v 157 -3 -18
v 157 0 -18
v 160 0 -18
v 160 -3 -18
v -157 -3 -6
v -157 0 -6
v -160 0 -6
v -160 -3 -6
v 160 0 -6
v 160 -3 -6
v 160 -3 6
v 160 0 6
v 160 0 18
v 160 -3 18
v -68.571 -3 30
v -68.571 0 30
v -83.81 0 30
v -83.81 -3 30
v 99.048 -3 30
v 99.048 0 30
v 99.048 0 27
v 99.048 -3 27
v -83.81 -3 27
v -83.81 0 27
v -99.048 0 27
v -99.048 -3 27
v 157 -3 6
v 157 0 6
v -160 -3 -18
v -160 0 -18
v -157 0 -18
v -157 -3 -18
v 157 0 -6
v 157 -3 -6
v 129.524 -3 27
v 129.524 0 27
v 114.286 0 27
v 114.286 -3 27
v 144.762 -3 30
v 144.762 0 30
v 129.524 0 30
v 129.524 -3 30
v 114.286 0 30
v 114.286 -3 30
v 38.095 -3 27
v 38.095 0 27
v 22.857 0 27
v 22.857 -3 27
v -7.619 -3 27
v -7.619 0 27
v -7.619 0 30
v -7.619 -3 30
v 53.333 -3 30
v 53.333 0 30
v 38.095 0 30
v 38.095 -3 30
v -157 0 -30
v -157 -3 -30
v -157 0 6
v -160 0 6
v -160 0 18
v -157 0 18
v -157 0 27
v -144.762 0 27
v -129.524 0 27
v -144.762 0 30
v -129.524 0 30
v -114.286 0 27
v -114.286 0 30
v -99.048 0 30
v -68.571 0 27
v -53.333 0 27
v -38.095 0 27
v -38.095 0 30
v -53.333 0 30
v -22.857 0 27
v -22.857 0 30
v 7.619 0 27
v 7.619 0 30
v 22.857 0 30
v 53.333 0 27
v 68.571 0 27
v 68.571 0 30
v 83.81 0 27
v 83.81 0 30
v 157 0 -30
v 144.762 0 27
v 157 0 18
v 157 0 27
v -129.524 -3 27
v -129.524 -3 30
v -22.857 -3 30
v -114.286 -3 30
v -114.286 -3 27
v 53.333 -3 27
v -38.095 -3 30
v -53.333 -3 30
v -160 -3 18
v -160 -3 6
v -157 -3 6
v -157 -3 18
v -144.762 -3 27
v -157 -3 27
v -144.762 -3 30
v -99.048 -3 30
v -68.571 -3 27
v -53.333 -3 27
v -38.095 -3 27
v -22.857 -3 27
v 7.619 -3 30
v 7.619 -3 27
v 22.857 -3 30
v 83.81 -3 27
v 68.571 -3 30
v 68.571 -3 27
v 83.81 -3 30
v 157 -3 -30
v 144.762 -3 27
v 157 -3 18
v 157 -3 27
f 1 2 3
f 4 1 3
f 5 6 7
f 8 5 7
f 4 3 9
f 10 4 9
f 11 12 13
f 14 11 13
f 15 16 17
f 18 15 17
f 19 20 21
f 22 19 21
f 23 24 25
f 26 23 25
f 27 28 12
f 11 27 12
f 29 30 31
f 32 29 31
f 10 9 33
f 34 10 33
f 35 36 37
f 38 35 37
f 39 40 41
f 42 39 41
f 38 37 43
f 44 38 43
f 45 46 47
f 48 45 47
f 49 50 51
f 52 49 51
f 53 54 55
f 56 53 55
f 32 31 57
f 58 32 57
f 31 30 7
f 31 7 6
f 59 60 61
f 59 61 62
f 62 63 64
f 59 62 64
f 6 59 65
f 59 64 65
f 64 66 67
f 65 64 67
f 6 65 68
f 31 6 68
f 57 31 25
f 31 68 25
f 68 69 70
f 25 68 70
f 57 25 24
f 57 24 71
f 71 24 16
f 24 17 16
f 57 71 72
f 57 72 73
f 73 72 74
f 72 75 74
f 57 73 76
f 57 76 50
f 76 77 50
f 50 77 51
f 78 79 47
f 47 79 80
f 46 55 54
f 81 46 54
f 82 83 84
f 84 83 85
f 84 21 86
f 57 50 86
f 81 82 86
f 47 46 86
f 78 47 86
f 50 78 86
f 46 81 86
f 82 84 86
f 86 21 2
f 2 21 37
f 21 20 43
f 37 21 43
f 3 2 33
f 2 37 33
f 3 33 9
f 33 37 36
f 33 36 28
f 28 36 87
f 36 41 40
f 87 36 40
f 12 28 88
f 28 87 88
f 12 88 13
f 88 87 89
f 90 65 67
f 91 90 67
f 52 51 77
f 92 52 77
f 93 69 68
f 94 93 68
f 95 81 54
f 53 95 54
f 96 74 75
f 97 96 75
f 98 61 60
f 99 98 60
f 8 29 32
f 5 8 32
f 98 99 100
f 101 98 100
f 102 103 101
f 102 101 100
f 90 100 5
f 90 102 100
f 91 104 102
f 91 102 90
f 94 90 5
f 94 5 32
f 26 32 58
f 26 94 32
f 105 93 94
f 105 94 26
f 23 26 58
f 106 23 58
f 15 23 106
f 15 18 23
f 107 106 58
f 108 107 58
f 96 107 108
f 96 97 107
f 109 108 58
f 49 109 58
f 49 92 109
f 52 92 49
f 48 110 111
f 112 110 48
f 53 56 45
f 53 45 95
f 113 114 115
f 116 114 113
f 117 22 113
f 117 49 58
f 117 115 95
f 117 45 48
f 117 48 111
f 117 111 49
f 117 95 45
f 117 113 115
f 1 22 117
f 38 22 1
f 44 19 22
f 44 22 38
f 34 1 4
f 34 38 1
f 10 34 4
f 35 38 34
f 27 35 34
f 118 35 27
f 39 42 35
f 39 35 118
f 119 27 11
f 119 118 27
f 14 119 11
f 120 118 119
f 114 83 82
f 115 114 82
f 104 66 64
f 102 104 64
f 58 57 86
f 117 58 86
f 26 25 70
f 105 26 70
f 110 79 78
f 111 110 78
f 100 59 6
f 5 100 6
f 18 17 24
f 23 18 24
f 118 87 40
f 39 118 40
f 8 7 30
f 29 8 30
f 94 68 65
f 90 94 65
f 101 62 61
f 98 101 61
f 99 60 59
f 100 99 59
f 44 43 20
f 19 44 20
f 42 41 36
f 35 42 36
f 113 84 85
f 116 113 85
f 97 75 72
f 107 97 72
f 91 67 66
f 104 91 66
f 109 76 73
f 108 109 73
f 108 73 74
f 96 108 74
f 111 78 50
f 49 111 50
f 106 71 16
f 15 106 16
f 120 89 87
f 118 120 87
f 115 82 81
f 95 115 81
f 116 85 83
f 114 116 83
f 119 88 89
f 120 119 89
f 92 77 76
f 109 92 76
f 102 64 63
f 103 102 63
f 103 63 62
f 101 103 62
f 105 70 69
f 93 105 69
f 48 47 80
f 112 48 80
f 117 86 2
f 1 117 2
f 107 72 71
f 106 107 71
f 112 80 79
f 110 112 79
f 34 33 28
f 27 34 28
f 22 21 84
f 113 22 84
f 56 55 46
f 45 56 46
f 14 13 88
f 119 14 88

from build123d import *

# Parameters (mm, degrees)
F1_DEPTH = 3


with BuildPart() as f1:
    # F0 (on Front) → F1 (new body)
    with BuildSketch(Plane.XZ):
        Polygon((-157, -30), (157, -30), (157, -18), (160, -18), (160, -6), (157, -6), (157, 6), (160, 6), (160, 18), (157, 18), (157, 27), (144.761905, 27), (144.761905, 30), (129.52381, 30), (129.52381, 27), (114.285714, 27), (114.285714, 30), (99.047619, 30), (99.047619, 27), (83.809524, 27), (83.809524, 30), (68.571429, 30), (68.571429, 27), (53.333333, 27), (53.333333, 30), (38.095238, 30), (38.095238, 27), (22.857143, 27), (22.857143, 30), (7.619048, 30), (7.619048, 27), (-7.619048, 27), (-7.619048, 30), (-22.857143, 30), (-22.857143, 27), (-38.095238, 27), (-38.095238, 30), (-53.333333, 30), (-53.333333, 27), (-68.571429, 27), (-68.571429, 30), (-83.809524, 30), (-83.809524, 27), (-99.047619, 27), (-99.047619, 30), (-114.285714, 30), (-114.285714, 27), (-129.52381, 27), (-129.52381, 30), (-144.761905, 30), (-144.761905, 27), (-157, 27), (-157, 18), (-160, 18), (-160, 6), (-157, 6), (-157, -6), (-160, -6), (-160, -18), (-157, -18), align=None)
    extrude(amount=F1_DEPTH)


solid = f1.part
